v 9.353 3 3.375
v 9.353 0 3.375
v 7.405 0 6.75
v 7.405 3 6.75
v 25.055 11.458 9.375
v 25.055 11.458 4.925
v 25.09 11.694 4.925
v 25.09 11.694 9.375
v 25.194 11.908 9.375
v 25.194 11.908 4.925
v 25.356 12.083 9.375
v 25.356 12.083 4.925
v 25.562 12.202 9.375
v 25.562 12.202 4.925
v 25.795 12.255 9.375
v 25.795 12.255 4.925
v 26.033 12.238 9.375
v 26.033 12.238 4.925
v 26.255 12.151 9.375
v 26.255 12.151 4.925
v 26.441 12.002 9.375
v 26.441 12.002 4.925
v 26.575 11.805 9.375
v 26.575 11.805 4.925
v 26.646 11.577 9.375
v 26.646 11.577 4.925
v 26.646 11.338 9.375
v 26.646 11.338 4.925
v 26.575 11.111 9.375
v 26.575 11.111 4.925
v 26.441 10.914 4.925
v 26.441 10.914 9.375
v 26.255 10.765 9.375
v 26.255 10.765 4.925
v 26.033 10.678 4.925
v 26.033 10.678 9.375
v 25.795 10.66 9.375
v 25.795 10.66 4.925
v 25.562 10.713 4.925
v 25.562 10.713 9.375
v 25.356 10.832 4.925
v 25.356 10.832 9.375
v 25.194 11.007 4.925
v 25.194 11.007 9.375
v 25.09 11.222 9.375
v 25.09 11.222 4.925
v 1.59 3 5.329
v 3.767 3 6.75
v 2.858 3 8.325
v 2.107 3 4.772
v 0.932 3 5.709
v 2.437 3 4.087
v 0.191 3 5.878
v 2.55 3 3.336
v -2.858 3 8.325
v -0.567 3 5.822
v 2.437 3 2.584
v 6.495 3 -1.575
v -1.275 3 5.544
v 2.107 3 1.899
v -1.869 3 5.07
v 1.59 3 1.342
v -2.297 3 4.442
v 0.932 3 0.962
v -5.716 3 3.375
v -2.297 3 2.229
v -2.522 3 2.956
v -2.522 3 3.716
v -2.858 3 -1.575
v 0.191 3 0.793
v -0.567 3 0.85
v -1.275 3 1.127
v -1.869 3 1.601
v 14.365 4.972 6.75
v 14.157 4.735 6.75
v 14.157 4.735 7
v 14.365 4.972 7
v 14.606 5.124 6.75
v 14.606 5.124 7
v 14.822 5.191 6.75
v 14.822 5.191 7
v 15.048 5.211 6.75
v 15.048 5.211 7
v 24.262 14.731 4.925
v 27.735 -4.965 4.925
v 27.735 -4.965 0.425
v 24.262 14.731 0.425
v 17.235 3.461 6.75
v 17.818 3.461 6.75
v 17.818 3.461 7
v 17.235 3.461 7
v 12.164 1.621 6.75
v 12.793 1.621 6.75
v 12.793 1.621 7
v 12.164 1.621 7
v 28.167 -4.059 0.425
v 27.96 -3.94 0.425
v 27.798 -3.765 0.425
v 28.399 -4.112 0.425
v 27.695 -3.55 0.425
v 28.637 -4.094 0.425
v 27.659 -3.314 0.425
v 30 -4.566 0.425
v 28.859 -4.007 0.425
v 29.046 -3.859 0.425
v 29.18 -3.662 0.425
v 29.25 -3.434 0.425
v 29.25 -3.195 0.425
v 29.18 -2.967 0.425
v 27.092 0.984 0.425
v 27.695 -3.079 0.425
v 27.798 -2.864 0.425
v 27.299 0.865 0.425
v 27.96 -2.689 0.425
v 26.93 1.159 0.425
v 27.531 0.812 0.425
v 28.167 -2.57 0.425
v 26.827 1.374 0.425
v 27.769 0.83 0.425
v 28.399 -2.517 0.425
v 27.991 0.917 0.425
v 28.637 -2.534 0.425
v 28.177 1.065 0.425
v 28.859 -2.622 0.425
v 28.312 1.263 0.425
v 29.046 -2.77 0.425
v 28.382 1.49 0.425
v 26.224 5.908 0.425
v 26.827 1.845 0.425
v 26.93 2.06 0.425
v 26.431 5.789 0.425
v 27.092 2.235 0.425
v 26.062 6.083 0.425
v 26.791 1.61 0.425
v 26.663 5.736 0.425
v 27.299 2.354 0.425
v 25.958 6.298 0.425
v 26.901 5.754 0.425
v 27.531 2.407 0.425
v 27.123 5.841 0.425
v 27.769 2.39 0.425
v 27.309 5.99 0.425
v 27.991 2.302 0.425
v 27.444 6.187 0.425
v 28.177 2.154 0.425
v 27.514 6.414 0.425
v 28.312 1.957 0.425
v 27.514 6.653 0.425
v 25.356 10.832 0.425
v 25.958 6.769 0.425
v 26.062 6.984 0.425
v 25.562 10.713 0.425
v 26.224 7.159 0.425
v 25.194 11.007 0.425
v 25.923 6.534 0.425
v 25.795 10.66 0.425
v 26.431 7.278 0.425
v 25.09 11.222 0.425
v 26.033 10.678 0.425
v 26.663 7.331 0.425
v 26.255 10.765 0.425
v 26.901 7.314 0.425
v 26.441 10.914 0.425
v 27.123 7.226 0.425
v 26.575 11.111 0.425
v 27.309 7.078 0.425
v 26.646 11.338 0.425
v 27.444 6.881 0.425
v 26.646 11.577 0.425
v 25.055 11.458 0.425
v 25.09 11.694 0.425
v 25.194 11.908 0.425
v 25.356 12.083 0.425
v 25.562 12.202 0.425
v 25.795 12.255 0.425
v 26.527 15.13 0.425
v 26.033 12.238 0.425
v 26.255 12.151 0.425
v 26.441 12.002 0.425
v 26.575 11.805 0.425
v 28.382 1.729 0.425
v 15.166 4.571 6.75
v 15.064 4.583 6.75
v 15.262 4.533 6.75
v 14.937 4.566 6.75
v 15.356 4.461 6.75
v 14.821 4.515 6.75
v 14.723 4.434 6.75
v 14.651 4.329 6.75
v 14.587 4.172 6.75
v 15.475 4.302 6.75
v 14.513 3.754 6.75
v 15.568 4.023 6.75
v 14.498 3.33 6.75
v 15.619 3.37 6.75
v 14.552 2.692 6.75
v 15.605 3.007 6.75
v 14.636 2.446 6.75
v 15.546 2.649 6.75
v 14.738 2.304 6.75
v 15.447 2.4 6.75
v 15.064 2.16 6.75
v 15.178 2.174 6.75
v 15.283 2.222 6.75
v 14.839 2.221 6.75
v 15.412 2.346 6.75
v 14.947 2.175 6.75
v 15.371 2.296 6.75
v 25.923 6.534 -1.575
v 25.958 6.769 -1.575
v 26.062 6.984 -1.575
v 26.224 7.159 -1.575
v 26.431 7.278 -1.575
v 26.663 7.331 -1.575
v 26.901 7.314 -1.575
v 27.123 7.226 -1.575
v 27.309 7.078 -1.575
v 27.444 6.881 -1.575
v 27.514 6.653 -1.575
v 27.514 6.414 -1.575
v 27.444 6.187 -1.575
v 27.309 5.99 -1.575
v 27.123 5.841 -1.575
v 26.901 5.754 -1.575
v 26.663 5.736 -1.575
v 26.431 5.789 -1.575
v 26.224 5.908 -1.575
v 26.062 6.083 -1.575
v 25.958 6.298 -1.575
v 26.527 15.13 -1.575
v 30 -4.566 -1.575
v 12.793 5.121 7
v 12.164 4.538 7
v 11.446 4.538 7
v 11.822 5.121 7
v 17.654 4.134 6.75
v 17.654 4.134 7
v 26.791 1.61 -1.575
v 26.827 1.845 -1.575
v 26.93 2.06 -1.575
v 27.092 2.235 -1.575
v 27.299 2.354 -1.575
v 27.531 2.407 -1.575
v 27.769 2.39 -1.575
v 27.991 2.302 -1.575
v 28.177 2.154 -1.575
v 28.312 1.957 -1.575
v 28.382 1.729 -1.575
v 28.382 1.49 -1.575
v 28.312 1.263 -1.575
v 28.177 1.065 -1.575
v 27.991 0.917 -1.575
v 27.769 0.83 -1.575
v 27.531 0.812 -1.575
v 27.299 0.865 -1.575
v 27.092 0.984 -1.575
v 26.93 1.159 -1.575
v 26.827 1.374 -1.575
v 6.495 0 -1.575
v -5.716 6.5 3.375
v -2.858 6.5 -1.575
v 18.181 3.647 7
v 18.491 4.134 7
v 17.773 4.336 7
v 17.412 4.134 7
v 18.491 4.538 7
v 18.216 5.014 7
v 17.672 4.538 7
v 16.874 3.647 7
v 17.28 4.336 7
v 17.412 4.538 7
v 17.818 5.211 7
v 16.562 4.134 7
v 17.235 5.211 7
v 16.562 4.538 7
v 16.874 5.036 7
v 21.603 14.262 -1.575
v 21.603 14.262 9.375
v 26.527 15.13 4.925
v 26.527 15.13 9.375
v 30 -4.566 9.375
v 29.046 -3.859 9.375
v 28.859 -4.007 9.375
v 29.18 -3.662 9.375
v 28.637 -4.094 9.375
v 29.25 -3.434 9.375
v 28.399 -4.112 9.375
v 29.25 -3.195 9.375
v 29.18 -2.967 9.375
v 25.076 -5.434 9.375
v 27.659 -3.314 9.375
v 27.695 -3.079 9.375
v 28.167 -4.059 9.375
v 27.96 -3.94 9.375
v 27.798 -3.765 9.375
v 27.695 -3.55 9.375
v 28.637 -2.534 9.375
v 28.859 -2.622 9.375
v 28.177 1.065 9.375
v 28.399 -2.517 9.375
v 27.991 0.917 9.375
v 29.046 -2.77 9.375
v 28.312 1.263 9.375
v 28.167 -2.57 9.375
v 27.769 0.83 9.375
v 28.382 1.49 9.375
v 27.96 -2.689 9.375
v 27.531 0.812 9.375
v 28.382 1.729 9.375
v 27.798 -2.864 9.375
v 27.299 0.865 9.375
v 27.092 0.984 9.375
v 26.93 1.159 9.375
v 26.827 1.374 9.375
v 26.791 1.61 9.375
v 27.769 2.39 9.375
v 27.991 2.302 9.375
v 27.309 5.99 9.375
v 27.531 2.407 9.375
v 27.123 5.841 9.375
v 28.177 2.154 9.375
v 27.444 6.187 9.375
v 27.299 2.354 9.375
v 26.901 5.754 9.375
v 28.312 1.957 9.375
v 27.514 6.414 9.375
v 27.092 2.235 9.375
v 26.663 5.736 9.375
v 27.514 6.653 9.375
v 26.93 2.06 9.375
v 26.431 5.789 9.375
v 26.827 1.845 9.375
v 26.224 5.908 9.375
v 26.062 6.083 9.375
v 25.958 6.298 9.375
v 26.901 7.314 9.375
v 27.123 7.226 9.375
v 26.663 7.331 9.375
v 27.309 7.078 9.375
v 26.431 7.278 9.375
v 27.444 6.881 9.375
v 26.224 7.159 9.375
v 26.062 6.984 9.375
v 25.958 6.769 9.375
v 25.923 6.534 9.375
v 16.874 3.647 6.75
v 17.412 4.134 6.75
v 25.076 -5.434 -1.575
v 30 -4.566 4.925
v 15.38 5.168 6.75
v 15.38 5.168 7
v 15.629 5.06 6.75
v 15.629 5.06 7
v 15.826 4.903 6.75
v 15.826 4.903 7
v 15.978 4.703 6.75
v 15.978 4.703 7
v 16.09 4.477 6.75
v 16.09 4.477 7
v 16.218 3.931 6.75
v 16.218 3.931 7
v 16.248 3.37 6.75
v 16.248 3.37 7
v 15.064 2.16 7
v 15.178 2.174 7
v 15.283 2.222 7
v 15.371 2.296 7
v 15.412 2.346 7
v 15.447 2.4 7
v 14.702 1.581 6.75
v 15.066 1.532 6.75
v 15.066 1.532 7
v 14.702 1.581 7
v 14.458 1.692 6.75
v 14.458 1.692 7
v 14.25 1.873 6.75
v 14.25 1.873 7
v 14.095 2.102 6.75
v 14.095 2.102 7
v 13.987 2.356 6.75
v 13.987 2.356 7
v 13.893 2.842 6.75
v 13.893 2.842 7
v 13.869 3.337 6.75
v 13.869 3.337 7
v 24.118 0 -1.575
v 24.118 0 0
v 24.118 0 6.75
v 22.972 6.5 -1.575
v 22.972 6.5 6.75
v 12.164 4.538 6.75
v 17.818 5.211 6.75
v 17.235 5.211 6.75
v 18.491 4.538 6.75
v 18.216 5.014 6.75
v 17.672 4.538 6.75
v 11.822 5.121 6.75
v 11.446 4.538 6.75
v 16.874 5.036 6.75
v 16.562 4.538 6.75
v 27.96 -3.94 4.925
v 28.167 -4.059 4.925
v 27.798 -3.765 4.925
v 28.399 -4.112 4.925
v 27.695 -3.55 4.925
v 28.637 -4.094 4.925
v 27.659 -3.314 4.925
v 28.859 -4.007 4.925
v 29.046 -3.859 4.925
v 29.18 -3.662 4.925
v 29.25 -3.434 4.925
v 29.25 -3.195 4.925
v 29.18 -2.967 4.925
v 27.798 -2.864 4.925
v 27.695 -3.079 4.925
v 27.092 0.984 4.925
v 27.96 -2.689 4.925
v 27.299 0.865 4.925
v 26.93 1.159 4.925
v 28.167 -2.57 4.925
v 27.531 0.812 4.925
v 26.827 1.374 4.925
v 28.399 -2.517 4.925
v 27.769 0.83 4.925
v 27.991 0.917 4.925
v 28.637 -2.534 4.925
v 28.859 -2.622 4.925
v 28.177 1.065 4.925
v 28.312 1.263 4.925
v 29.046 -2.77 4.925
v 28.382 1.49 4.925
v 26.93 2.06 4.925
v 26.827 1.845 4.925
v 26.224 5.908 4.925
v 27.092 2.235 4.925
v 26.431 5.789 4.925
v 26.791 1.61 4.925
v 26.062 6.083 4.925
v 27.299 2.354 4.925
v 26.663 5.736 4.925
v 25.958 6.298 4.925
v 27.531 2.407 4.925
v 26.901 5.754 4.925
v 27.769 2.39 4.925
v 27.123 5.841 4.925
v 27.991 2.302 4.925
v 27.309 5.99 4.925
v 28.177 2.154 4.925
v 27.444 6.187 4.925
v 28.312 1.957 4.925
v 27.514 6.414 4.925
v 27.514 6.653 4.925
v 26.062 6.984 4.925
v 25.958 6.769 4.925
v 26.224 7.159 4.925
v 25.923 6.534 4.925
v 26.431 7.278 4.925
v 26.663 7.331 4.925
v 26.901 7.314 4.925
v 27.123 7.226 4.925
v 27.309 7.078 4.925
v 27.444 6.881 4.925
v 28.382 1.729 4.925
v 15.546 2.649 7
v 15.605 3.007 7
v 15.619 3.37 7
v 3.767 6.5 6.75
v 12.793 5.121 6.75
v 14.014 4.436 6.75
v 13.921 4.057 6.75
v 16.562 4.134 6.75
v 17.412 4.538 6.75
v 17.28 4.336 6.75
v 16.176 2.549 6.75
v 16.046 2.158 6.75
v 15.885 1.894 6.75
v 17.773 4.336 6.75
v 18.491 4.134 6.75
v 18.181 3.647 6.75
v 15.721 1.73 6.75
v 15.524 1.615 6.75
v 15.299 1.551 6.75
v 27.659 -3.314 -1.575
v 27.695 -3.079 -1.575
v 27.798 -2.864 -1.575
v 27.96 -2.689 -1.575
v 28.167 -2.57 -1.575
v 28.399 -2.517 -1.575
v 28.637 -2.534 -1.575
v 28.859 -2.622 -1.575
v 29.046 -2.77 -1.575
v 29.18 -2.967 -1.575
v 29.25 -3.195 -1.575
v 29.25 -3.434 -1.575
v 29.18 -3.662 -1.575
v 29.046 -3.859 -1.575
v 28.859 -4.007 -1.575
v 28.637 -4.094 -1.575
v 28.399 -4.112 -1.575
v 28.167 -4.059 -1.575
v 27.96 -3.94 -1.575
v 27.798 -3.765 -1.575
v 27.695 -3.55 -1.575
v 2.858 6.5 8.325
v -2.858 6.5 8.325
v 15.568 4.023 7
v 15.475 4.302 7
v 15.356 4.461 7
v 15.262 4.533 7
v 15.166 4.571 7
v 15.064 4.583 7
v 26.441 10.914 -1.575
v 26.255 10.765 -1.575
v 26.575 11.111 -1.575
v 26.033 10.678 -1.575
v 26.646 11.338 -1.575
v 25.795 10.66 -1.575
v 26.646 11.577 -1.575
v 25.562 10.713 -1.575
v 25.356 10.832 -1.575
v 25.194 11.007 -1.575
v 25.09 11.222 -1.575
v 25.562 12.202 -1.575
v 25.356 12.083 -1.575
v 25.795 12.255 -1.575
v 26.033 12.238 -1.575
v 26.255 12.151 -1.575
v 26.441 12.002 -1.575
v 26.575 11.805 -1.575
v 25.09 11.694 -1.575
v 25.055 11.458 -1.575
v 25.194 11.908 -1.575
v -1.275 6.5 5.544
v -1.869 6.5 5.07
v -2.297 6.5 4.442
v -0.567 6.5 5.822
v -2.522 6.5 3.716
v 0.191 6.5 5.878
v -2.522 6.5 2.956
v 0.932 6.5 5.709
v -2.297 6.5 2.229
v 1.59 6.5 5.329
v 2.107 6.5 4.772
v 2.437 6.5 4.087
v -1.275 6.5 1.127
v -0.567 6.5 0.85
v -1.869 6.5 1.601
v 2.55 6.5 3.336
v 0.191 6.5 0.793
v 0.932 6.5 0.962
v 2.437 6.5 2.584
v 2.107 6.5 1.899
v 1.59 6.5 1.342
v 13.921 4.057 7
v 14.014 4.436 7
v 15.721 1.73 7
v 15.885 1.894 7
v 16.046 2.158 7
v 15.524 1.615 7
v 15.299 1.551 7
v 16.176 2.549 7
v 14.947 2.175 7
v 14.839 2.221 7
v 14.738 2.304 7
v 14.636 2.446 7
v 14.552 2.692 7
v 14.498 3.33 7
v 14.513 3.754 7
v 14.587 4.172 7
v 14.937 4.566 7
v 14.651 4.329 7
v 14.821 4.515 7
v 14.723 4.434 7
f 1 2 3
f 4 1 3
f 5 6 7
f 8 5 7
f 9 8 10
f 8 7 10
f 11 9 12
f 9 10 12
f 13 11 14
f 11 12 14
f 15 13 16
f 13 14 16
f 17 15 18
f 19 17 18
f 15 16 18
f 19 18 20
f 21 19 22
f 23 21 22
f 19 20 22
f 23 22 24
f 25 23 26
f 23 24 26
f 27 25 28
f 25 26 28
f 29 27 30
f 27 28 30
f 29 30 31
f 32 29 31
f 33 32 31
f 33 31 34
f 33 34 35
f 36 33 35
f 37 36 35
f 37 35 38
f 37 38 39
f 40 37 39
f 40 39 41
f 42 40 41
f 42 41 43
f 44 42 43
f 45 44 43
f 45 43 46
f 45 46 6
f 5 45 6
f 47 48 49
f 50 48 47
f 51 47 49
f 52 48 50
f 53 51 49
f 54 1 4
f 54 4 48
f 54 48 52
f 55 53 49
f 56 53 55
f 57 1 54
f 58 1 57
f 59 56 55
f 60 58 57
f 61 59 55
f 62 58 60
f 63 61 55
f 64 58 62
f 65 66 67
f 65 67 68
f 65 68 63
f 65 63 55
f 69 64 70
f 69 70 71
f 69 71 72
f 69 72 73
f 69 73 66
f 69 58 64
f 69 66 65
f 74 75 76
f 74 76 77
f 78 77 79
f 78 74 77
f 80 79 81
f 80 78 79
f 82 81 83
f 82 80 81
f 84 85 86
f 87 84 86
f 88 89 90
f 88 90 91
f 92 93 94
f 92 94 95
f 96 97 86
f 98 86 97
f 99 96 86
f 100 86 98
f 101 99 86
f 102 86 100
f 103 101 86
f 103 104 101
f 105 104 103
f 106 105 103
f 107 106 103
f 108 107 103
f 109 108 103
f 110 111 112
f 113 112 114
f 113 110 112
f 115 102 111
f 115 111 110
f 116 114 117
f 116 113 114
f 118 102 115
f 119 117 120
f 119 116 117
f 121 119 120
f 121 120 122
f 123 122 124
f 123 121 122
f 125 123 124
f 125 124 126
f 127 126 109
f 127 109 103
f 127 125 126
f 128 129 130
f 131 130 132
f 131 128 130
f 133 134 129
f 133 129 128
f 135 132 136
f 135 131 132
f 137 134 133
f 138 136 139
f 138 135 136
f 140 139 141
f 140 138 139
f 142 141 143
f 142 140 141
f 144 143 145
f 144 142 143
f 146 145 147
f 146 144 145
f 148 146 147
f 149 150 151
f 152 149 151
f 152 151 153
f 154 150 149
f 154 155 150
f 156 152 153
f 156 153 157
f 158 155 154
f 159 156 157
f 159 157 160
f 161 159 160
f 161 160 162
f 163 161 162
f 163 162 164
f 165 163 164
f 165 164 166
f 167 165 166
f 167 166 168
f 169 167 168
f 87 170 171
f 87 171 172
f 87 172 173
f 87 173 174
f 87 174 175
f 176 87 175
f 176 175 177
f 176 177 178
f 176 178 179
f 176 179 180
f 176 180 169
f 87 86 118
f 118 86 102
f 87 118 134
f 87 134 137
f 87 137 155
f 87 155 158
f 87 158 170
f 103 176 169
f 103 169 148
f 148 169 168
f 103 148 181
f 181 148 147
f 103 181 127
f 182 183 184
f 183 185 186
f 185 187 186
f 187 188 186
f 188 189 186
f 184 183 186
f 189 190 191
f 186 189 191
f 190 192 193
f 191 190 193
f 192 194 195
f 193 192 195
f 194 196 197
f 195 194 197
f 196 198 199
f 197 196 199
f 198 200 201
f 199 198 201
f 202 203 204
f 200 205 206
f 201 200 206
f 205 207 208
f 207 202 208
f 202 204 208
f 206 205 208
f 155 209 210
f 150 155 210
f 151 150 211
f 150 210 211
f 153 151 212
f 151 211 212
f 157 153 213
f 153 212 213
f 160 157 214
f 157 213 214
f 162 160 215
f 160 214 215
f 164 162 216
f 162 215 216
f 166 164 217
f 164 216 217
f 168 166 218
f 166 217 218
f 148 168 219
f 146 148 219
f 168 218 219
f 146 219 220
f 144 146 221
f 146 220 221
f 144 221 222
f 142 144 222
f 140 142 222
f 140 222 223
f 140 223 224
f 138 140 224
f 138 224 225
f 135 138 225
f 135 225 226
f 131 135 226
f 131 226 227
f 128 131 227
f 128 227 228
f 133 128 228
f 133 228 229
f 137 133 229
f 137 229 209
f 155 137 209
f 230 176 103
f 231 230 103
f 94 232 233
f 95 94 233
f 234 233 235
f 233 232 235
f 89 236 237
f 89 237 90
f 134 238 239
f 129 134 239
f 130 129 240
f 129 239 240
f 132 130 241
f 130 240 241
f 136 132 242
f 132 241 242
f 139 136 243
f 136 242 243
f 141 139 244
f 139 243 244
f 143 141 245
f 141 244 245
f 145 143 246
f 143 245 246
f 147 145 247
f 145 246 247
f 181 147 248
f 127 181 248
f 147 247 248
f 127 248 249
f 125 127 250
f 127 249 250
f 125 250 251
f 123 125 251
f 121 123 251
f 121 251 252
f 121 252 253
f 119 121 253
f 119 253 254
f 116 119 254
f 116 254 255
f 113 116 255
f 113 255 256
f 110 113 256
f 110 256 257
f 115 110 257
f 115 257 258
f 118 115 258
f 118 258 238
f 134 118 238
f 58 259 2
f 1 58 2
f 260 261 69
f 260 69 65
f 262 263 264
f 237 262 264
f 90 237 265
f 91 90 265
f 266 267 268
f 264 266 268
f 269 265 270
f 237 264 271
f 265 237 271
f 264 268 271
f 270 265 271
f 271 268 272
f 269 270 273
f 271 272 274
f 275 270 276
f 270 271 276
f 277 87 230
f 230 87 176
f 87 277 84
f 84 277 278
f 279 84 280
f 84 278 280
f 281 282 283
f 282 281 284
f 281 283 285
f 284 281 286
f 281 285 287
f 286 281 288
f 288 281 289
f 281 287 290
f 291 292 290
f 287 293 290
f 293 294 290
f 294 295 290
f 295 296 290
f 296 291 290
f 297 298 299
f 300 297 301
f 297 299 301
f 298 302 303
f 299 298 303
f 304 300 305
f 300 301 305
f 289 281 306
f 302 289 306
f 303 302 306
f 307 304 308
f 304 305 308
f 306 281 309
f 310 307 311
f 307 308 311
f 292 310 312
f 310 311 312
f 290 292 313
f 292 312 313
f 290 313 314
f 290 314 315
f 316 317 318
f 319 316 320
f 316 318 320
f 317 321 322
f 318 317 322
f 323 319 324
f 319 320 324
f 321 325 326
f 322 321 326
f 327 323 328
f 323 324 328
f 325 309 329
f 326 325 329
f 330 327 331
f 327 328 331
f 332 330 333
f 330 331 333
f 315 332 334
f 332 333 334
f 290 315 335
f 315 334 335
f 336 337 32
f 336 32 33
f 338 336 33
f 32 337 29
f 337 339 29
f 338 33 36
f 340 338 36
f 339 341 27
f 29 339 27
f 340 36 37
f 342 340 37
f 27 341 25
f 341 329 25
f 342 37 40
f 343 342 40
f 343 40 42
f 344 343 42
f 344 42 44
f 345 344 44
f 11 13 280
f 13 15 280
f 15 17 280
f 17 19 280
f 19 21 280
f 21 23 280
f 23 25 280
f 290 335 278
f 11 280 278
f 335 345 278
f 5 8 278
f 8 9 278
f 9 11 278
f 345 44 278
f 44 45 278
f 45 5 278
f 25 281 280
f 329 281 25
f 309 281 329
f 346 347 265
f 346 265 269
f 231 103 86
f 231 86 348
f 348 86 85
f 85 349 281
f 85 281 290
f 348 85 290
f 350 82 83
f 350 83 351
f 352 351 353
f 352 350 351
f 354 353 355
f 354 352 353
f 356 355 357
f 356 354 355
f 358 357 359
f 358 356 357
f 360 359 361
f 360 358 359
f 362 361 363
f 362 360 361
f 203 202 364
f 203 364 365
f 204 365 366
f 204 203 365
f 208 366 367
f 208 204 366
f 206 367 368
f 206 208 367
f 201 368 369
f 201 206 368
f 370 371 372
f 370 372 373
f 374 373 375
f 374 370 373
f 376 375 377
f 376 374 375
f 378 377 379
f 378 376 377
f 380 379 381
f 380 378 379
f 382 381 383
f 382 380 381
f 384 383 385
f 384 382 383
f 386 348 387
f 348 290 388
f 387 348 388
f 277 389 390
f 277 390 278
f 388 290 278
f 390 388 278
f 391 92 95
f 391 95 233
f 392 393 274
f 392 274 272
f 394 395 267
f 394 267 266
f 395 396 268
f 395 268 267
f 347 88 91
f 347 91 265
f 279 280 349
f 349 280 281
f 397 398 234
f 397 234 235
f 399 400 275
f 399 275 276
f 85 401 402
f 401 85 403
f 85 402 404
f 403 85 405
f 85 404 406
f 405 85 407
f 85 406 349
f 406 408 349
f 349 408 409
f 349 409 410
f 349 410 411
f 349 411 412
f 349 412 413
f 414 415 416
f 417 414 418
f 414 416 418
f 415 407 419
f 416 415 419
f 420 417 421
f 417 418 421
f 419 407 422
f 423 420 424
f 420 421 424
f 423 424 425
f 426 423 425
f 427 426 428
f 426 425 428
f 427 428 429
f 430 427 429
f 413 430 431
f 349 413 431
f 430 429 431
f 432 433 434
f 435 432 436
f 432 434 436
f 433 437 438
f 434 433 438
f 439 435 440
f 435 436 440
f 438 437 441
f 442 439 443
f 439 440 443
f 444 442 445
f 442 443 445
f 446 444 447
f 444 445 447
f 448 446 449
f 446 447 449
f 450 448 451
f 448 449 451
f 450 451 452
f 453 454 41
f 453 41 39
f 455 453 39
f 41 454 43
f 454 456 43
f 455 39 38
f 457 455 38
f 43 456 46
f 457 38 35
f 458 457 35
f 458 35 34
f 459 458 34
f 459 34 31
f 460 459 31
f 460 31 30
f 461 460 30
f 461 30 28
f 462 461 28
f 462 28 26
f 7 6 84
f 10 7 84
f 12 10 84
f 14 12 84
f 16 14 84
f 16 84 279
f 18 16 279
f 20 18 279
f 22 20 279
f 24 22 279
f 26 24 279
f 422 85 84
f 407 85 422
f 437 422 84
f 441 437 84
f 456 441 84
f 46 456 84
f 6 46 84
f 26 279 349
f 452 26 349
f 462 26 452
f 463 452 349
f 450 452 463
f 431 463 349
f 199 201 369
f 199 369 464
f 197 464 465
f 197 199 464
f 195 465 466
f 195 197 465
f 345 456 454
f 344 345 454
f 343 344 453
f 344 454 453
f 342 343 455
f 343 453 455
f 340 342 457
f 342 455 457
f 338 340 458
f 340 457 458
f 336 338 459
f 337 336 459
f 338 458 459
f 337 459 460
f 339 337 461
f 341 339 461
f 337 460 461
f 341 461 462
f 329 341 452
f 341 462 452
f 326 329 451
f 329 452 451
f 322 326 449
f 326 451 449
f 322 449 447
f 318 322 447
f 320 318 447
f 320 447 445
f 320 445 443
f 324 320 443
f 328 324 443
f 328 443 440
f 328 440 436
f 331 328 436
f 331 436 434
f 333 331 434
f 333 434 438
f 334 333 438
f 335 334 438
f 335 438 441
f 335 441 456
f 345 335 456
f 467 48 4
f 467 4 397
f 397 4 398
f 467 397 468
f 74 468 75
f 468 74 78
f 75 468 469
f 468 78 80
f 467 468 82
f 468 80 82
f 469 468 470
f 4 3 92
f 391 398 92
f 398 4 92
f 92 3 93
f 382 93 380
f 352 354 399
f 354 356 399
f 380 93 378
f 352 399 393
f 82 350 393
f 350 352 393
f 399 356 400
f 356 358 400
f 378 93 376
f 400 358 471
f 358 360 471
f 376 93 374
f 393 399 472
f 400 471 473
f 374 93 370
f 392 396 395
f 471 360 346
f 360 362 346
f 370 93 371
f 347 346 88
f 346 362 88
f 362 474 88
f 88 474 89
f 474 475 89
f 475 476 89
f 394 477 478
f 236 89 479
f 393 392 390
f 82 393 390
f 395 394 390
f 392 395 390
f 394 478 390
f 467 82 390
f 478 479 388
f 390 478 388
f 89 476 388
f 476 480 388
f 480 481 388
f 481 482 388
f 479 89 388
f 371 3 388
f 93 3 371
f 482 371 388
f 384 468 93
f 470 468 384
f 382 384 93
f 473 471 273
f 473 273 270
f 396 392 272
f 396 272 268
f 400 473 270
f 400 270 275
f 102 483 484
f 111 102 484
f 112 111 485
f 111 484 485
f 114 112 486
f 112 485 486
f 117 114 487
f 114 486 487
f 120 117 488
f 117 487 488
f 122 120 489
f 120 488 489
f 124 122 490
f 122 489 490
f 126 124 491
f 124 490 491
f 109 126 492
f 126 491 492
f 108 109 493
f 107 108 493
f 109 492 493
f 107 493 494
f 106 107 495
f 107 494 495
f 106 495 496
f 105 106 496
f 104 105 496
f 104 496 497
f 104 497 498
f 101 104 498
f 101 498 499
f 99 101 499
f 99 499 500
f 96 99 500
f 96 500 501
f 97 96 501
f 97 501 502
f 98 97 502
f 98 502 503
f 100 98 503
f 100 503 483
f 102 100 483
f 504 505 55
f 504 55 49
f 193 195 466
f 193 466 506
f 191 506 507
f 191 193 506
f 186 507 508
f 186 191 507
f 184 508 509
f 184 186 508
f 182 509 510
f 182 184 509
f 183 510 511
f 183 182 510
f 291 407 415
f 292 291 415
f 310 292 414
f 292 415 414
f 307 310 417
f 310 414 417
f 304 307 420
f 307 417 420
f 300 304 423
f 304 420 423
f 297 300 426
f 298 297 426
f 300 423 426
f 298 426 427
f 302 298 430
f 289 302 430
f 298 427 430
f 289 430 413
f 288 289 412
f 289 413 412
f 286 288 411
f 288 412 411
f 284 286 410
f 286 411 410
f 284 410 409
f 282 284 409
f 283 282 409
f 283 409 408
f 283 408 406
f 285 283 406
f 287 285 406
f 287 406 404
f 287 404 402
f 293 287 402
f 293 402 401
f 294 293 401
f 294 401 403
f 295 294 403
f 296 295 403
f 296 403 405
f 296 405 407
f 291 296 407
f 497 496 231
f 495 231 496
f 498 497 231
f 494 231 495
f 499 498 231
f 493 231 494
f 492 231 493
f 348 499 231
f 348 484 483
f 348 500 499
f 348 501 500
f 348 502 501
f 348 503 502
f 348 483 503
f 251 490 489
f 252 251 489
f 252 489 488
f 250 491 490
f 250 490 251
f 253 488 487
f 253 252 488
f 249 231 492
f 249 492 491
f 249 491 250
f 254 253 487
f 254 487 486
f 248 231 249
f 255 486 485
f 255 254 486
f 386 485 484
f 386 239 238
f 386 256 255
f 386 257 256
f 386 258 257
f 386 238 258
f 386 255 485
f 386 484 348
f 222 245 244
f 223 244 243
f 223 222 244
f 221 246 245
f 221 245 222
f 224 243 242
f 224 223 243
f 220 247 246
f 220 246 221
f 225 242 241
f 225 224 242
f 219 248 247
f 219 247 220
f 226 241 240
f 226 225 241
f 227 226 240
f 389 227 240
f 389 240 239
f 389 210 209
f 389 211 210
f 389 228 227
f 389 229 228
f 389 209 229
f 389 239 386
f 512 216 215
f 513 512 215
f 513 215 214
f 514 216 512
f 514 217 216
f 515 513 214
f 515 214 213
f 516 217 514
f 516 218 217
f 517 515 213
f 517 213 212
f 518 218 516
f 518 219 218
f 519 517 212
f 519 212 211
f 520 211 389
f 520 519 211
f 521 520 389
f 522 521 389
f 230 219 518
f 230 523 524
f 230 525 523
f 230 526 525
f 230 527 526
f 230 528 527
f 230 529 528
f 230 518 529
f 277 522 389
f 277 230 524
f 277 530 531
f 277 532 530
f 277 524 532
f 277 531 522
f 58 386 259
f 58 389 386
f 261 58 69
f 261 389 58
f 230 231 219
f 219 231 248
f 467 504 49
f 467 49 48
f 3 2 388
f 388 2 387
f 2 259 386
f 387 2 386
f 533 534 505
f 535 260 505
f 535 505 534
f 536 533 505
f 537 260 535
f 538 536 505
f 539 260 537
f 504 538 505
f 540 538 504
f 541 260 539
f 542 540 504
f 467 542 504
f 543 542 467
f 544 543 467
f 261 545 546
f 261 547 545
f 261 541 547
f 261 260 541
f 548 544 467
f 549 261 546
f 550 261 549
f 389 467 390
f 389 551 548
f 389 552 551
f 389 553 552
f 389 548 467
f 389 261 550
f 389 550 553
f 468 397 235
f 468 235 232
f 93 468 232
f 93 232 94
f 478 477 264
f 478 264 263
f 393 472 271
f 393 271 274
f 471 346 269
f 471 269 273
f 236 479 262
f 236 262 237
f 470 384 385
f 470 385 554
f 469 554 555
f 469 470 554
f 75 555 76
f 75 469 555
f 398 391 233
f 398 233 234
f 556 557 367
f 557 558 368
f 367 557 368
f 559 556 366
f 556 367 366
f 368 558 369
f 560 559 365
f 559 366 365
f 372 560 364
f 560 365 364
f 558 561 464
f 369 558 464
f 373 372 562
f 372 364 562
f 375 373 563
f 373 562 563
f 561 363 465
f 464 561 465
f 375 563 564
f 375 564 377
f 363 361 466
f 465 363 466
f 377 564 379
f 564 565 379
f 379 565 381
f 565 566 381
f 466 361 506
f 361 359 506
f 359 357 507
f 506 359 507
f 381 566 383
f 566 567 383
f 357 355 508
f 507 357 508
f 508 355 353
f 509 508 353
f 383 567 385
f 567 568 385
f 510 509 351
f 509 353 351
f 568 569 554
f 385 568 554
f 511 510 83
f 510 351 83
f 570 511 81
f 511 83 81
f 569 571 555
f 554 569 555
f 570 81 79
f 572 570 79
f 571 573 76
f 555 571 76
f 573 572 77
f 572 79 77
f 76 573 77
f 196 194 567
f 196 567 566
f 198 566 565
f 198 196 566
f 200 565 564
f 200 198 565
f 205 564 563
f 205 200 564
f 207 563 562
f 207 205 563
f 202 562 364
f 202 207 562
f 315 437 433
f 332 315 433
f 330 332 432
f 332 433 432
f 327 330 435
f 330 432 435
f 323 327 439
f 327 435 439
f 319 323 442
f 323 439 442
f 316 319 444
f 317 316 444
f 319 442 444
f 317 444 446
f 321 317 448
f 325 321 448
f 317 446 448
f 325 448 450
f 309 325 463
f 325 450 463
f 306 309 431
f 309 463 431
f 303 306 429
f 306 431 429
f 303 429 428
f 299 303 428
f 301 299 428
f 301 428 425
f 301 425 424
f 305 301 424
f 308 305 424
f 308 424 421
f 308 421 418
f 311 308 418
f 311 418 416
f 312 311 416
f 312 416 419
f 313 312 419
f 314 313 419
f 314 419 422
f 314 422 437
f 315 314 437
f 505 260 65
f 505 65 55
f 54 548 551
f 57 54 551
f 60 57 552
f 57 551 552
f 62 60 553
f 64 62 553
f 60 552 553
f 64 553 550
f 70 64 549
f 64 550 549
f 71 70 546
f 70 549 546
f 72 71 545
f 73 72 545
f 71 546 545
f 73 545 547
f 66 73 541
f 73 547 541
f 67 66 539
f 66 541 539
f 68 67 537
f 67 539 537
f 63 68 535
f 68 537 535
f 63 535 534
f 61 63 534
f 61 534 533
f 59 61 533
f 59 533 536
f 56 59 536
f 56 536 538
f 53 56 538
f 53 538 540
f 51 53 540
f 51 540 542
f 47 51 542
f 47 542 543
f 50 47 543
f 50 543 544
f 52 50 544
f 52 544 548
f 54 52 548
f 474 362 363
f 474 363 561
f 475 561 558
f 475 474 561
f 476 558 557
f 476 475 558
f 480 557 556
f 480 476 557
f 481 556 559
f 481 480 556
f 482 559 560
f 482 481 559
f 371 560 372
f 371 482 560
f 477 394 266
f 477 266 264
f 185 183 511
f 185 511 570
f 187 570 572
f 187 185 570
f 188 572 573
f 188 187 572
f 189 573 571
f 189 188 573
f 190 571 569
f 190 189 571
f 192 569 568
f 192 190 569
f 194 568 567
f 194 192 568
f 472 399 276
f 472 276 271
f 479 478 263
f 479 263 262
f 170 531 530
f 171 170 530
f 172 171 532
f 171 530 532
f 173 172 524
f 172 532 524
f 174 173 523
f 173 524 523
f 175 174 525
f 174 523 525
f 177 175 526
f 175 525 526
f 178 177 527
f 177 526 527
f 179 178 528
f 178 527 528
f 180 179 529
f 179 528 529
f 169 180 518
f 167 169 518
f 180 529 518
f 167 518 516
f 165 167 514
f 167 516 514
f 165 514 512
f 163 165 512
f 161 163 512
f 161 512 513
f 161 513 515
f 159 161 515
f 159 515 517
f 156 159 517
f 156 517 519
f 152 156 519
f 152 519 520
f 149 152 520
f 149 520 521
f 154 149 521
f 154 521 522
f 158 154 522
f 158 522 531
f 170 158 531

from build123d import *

# Parameters (mm, degrees)
SKETCH1_W                = 25
SKETCH1_H                = 6.75
BOSS_EXTRUDE1_DEPTH      = 6.5
BOSS_EXTRUDE4_DEPTH      = 6.5
BOSS_EXTRUDE3_DEPTH      = 6
BOSS_EXTRUDE3_DEPTH_BACK = 4.95
SKETCH4_W                = 2.3
SKETCH4_H                = 4.5
CUT_EXTRUDE1_DEPTH       = 23
SKETCH6_R                = 2.55
CUT_EXTRUDE2_DEPTH       = 10
BOSS_EXTRUDE5_DEPTH      = 1.575
CUT_EXTRUDE3_DEPTH       = 3
SKETCH9_R                = 0.8
CUT_EXTRUDE4_DEPTH       = 10.95
BOSS_EXTRUDE6_DEPTH      = 0.25


with BuildPart() as part:
    # Sketch1 → Boss-Extrude1 (new body)
    with BuildSketch(Plane(origin=(0, 0, 0), x_dir=(1, 0, 0), z_dir=(0, 1, 0))):
        with Locations((12.5, -3.375)):
            Rectangle(SKETCH1_W, SKETCH1_H)
    extrude(amount=BOSS_EXTRUDE1_DEPTH)

    # Sketch5 → Boss-Extrude4 (add)
    with BuildSketch(Plane(origin=(0, 6.5, 0), x_dir=(1, 0, 0), z_dir=(0, 1, 0))):
        Polygon((-5.715767665, -3.375), (-2.857883832, -8.325), (2.857883832, -8.325), (5.715767665, -3.375), (2.857883832, 1.575), (-2.857883832, 1.575), align=None)
    extrude(amount=-BOSS_EXTRUDE4_DEPTH)

    # Sketch3 → Boss-Extrude3 (add, two sides)
    with BuildSketch(Plane.XY.offset(3.375)) as boss_extrude3_sk:
        Polygon((21.602997682, 14.262034616), (26.527036447, 15.130275504), (30, -4.565879556), (25.075961235, -5.434120444), align=None)
    extrude(amount=BOSS_EXTRUDE3_DEPTH)
    extrude(boss_extrude3_sk.sketch, amount=-BOSS_EXTRUDE3_DEPTH_BACK)

    # Sketch4 → Cut-Extrude1 (cut)
    with BuildSketch(Plane(origin=(-1.787541475, 10.137651469, 0), x_dir=(0.984807753, 0.173648178, 0), z_dir=(-0.173648178, 0.984807753, 0))):
        with Locations((27.601375926, -2.675)):
            Rectangle(SKETCH4_W, SKETCH4_H)
    extrude(amount=-CUT_EXTRUDE1_DEPTH, mode=Mode.SUBTRACT)

    # Sketch6 → Cut-Extrude2 (cut)
    with BuildSketch(Plane(origin=(0, 6.5, 0), x_dir=(1, 0, 0), z_dir=(0, 1, 0))):
        with Locations((0, -3.335615973)):
            Circle(SKETCH6_R)
    extrude(amount=-CUT_EXTRUDE2_DEPTH, mode=Mode.SUBTRACT)

    # Sketch7 → Boss-Extrude5 (add)
    with BuildSketch(Plane(origin=(0, 0, -1.575), x_dir=(-1, 0, 0), z_dir=(0, 0, -1))):
        Polygon((-2.857883832, 0), (-24.117779184, 0), (-25.075961235, -5.434120444), (-30, -4.565879556), (-26.527036447, 15.130275504), (-21.602997682, 14.262034616), (-22.97165381, 6.5), (-2.857883832, 6.5), align=None)
    extrude(amount=-BOSS_EXTRUDE5_DEPTH)

    # Sketch8 → Cut-Extrude3 (cut)
    with BuildSketch(Plane(origin=(0, 0, 0), x_dir=(-1, 0, 0), z_dir=(0, -1, 0))):
        Polygon((-4.67653718, -11.475), (4.67653718, -11.475), (9.353074361, -3.375), (4.67653718, 4.725), (-4.67653718, 4.725), (-9.353074361, -3.375), align=None)
    extrude(amount=-CUT_EXTRUDE3_DEPTH, mode=Mode.SUBTRACT)

    # Sketch9 → Cut-Extrude4 (cut)
    with BuildSketch(Plane(origin=(0, 0, -1.575), x_dir=(-1, 0, 0), z_dir=(0, 0, -1))):
        with Locations((-28.459277655, -3.314410557)):
            Circle(SKETCH9_R)
        with Locations((-27.591036766, 1.609628208)):
            Circle(SKETCH9_R)
        with Locations((-26.722795878, 6.533666973)):
            Circle(SKETCH9_R)
        with Locations((-25.85455499, 11.457705738)):
            Circle(SKETCH9_R)
    extrude(amount=-CUT_EXTRUDE4_DEPTH, mode=Mode.SUBTRACT)

    # Sketch10 → Boss-Extrude6 (add)
    with BuildSketch(Plane.XY.offset(6.75)):
        Polygon((11.821517388, 5.121255448), (12.792571074, 5.121255448), (12.792571074, 1.621255448), (12.164365946, 1.621255448), (12.164365946, 4.537922115), (11.446417228, 4.537922115), align=None)
        with BuildLine():
            add(Edge.make_bspline(
                [(15.048079888, 5.210999038), (15.078487624, 5.210547627), (15.138277356, 5.209660031), (15.226336378, 5.20004665), (15.311161562, 5.185523511), (15.393084756, 5.165268798), (15.471516268, 5.138462406), (15.54702694, 5.106375614), (15.618717974, 5.067325404), (15.687503662, 5.023216186), (15.753357507, 4.973278299), (15.814696757, 4.916346529), (15.872641599, 4.853730878), (15.925937739, 4.784484711), (15.975765436, 4.709237895), (16.021960966, 4.627978498), (16.064170689, 4.540308809), (16.102867677, 4.446070622), (16.137470646, 4.343851347), (16.166616684, 4.232478485), (16.191614288, 4.111926601), (16.21271403, 3.981895624), (16.228662025, 3.842212712), (16.239411294, 3.692970662), (16.246787952, 3.534457192), (16.247389983, 3.425718255), (16.247699279, 3.369853205)],
                knots=[0, 0, 0, 0, 9.1189e-05, 0.000179302, 0.000265406, 0.000349239, 0.000432161, 0.00051382, 0.000595069, 0.000676752, 0.000758786, 0.000842642, 0.00092749, 0.00101444, 0.001104474, 0.001198046, 0.001294628, 0.001396185, 0.001503495, 0.001618119, 0.001741326, 0.001872727, 0.002013179, 0.002162939, 0.002321548, 0.002489129, 0.002489129, 0.002489129, 0.002489129], degree=3))
            add(Edge.make_bspline(
                [(16.247699279, 3.369853205), (16.247365014, 3.31328922), (16.246715542, 3.203386413), (16.239717944, 3.043423099), (16.22766775, 2.893097462), (16.212136589, 2.752425056), (16.190863148, 2.621480168), (16.165948991, 2.499923737), (16.136342892, 2.387799826), (16.100600112, 2.285361073), (16.062137358, 2.190957383), (16.019812173, 2.10345863), (15.974362278, 2.022627817), (15.926830158, 1.947245503), (15.874609927, 1.87953392), (15.82024329, 1.817190519), (15.761363027, 1.762590042), (15.700448226, 1.712918623), (15.635267329, 1.66999255), (15.566492532, 1.632450114), (15.492897697, 1.601998739), (15.415824335, 1.57551376), (15.333958715, 1.556500403), (15.248601668, 1.541413929), (15.158789533, 1.533076218), (15.097641814, 1.53204187), (15.066309055, 1.531511859)],
                knots=[0, 0, 0, 0, 0.000169685, 0.000329694, 0.000480207, 0.000622052, 0.000754146, 0.000878038, 0.000994198, 0.001101735, 0.001203292, 0.001299874, 0.001393102, 0.001481398, 0.001566938, 0.001649385, 0.001729242, 0.001807533, 0.001884926, 0.001963041, 0.002042215, 0.002123584, 0.00220725, 0.002294045, 0.002383484, 0.002477476, 0.002477476, 0.002477476, 0.002477476], degree=3))
            add(Edge.make_bspline(
                [(15.066309055, 1.531511859), (15.034977142, 1.532052093), (14.973598385, 1.533110405), (14.883543389, 1.541351934), (14.797733993, 1.556561518), (14.715220684, 1.575659731), (14.63657774, 1.601940139), (14.561428072, 1.633302597), (14.490349515, 1.670610787), (14.423145264, 1.713636874), (14.360044773, 1.762975953), (14.300067462, 1.818100286), (14.243346003, 1.878870149), (14.19074327, 1.945966213), (14.141397784, 2.018492887), (14.095824138, 2.097278389), (14.054049723, 2.18220801), (14.014767826, 2.273400132), (13.980636829, 2.372818019), (13.950261828, 2.481349457), (13.925379425, 2.599899148), (13.905367332, 2.728429006), (13.889389688, 2.866666733), (13.877504158, 3.014679055), (13.870467691, 3.17253491), (13.869825031, 3.281037103), (13.869494151, 3.33690048)],
                knots=[0, 0, 0, 0, 9.3992e-05, 0.000184129, 0.000270924, 0.000355272, 0.000437971, 0.000519356, 0.000599327, 0.000678482, 0.000758422, 0.000839307, 0.000922649, 0.001007511, 0.001094825, 0.001185617, 0.00128031, 0.001378632, 0.00148329, 0.001595393, 0.001716541, 0.001846447, 0.001985506, 0.002133922, 0.00229183, 0.002459412, 0.002459412, 0.002459412, 0.002459412], degree=3))
            add(Edge.make_bspline(
                [(13.869494151, 3.33690048), (13.870093509, 3.414518246), (13.871249978, 3.564282724), (13.885905598, 3.78064885), (13.907416331, 3.980641854), (13.939010504, 4.163927197), (13.978076261, 4.331183713), (14.028101996, 4.481309605), (14.085052658, 4.6163822), (14.133581938, 4.696400019), (14.156954087, 4.734937339)],
                knots=[0, 0, 0, 0, 0.00023281, 0.000449211, 0.000650286, 0.000835979, 0.001006883, 0.001164965, 0.001310334, 0.001445389, 0.001445389, 0.001445389, 0.001445389], degree=3))
            add(Edge.make_bspline(
                [(14.156954087, 4.734937339), (14.184130109, 4.772796391), (14.237264587, 4.846818296), (14.330171707, 4.943995222), (14.42998831, 5.027105688), (14.538764575, 5.094268828), (14.654780157, 5.147233687), (14.77903111, 5.18464217), (14.911058597, 5.206438095), (15.001724074, 5.209456021), (15.048079888, 5.210999038)],
                knots=[0, 0, 0, 0, 0.000139664, 0.000273071, 0.000402072, 0.00052834, 0.000655415, 0.000783615, 0.000916514, 0.00105555, 0.00105555, 0.00105555, 0.00105555], degree=3))
        make_face()
        with BuildLine():
            add(Edge.make_bspline(
                [(15.063504568, 4.58279391), (15.036015723, 4.581490993), (14.982122994, 4.578936585), (14.903922078, 4.557253264), (14.830183496, 4.523762204), (14.774092526, 4.483460951), (14.732108993, 4.444827367), (14.702774798, 4.409865229), (14.674486589, 4.370850003), (14.649501019, 4.326021133), (14.625908119, 4.276989372), (14.602850744, 4.223532146), (14.583949751, 4.16433643), (14.565380027, 4.100410333), (14.549111215, 4.029986471), (14.535481518, 3.952489204), (14.523304581, 3.867414562), (14.514811023, 3.77470682), (14.506892478, 3.674462974), (14.501216089, 3.566459719), (14.498842934, 3.450726192), (14.49808858, 3.371022229), (14.497699279, 3.329889262)],
                knots=[0, 0, 0, 0, 8.233e-05, 0.000161411, 0.000241719, 0.000324202, 0.000367359, 0.000412607, 0.000460858, 0.000511731, 0.000566293, 0.000624109, 0.000686189, 0.000752544, 0.000823804, 0.000902881, 0.00098855, 0.001081546, 0.001182103, 0.001290221, 0.00140594, 0.001529346, 0.001529346, 0.001529346, 0.001529346], degree=3))
            add(Edge.make_bspline(
                [(14.497699279, 3.329889262), (14.498340021, 3.276599515), (14.499568691, 3.174412475), (14.50600389, 3.027463952), (14.518902713, 2.893728963), (14.534946244, 2.772301138), (14.557480038, 2.663967967), (14.583406627, 2.567704519), (14.61542366, 2.484737918), (14.65242551, 2.413868282), (14.693406726, 2.35357963), (14.737893638, 2.302334004), (14.784371628, 2.257957709), (14.834291423, 2.221911392), (14.887533931, 2.194287156), (14.943654674, 2.174417385), (15.002689316, 2.16225427), (15.043115631, 2.160567637), (15.063504568, 2.159716987)],
                knots=[0, 0, 0, 0, 0.00015988, 0.000306582, 0.00044109, 0.000562851, 0.000673817, 0.000772822, 0.000861618, 0.000940022, 0.001012169, 0.001079776, 0.001143265, 0.001204556, 0.001263825, 0.001322589, 0.001382678, 0.00144382, 0.00144382, 0.00144382, 0.00144382], degree=3))
            add(Edge.make_bspline(
                [(15.063504568, 2.159716987), (15.083193821, 2.160299065), (15.121742931, 2.161438701), (15.177956166, 2.173136917), (15.231115396, 2.192155675), (15.281060116, 2.219059043), (15.327968971, 2.253270793), (15.3716127, 2.294941264), (15.411662151, 2.344485814), (15.434995142, 2.381255198), (15.447018189, 2.400201762)],
                knots=[0, 0, 0, 0, 5.8998e-05, 0.000115512, 0.000171399, 0.00022786, 0.000285078, 0.000345085, 0.000408376, 0.000475658, 0.000475658, 0.000475658, 0.000475658], degree=3))
            add(Edge.make_bspline(
                [(15.447018189, 2.400201762), (15.461173303, 2.426091637), (15.490855427, 2.480380606), (15.525203632, 2.571991216), (15.554116037, 2.675312843), (15.579000521, 2.790667033), (15.596019991, 2.918508758), (15.610677137, 3.058027363), (15.617746642, 3.209925406), (15.618896536, 3.315160919), (15.619494151, 3.369853205)],
                knots=[0, 0, 0, 0, 8.843e-05, 0.000185431, 0.00029262, 0.000410194, 0.000539093, 0.000679319, 0.000830958, 0.000995045, 0.000995045, 0.000995045, 0.000995045], degree=3))
            add(Edge.make_bspline(
                [(15.619494151, 3.369853205), (15.619263305, 3.425020246), (15.618818967, 3.531207384), (15.61066664, 3.683651511), (15.599313902, 3.822883921), (15.582708123, 3.948593764), (15.561341771, 4.061086209), (15.535007661, 4.160353902), (15.503961704, 4.246592481), (15.467144899, 4.319715953), (15.426368, 4.381860874), (15.383082077, 4.435176395), (15.3371041, 4.480695842), (15.288510958, 4.518590513), (15.236177946, 4.547544883), (15.181104694, 4.567989064), (15.123178296, 4.580357108), (15.083664292, 4.581970679), (15.063504568, 4.58279391)],
                knots=[0, 0, 0, 0, 0.000165478, 0.000318517, 0.00045785, 0.000584474, 0.000698739, 0.000801125, 0.000892295, 0.000973192, 0.001046115, 0.001114882, 0.001178838, 0.00123984, 0.001299154, 0.001357499, 0.001415527, 0.00147597, 0.00147597, 0.00147597, 0.00147597], degree=3))
        make_face(mode=Mode.SUBTRACT)
        Polygon((17.234878766, 5.210999038), (17.8182121, 5.210999038), (17.672378766, 4.537922115), (18.215748157, 5.013983814), (18.491289023, 4.537922115), (17.773340305, 4.335999038), (18.491289023, 4.134075961), (18.180692068, 3.647497435), (17.6541496, 4.134075961), (17.8182121, 3.460999038), (17.234878766, 3.460999038), (17.412262581, 4.134075961), (16.873801042, 3.647497435), (16.561801843, 4.134075961), (17.279750561, 4.335999038), (16.561801843, 4.537922115), (16.873801042, 5.036419711), (17.412262581, 4.537922115), align=None)
    extrude(amount=BOSS_EXTRUDE6_DEPTH)


solid = part.part
